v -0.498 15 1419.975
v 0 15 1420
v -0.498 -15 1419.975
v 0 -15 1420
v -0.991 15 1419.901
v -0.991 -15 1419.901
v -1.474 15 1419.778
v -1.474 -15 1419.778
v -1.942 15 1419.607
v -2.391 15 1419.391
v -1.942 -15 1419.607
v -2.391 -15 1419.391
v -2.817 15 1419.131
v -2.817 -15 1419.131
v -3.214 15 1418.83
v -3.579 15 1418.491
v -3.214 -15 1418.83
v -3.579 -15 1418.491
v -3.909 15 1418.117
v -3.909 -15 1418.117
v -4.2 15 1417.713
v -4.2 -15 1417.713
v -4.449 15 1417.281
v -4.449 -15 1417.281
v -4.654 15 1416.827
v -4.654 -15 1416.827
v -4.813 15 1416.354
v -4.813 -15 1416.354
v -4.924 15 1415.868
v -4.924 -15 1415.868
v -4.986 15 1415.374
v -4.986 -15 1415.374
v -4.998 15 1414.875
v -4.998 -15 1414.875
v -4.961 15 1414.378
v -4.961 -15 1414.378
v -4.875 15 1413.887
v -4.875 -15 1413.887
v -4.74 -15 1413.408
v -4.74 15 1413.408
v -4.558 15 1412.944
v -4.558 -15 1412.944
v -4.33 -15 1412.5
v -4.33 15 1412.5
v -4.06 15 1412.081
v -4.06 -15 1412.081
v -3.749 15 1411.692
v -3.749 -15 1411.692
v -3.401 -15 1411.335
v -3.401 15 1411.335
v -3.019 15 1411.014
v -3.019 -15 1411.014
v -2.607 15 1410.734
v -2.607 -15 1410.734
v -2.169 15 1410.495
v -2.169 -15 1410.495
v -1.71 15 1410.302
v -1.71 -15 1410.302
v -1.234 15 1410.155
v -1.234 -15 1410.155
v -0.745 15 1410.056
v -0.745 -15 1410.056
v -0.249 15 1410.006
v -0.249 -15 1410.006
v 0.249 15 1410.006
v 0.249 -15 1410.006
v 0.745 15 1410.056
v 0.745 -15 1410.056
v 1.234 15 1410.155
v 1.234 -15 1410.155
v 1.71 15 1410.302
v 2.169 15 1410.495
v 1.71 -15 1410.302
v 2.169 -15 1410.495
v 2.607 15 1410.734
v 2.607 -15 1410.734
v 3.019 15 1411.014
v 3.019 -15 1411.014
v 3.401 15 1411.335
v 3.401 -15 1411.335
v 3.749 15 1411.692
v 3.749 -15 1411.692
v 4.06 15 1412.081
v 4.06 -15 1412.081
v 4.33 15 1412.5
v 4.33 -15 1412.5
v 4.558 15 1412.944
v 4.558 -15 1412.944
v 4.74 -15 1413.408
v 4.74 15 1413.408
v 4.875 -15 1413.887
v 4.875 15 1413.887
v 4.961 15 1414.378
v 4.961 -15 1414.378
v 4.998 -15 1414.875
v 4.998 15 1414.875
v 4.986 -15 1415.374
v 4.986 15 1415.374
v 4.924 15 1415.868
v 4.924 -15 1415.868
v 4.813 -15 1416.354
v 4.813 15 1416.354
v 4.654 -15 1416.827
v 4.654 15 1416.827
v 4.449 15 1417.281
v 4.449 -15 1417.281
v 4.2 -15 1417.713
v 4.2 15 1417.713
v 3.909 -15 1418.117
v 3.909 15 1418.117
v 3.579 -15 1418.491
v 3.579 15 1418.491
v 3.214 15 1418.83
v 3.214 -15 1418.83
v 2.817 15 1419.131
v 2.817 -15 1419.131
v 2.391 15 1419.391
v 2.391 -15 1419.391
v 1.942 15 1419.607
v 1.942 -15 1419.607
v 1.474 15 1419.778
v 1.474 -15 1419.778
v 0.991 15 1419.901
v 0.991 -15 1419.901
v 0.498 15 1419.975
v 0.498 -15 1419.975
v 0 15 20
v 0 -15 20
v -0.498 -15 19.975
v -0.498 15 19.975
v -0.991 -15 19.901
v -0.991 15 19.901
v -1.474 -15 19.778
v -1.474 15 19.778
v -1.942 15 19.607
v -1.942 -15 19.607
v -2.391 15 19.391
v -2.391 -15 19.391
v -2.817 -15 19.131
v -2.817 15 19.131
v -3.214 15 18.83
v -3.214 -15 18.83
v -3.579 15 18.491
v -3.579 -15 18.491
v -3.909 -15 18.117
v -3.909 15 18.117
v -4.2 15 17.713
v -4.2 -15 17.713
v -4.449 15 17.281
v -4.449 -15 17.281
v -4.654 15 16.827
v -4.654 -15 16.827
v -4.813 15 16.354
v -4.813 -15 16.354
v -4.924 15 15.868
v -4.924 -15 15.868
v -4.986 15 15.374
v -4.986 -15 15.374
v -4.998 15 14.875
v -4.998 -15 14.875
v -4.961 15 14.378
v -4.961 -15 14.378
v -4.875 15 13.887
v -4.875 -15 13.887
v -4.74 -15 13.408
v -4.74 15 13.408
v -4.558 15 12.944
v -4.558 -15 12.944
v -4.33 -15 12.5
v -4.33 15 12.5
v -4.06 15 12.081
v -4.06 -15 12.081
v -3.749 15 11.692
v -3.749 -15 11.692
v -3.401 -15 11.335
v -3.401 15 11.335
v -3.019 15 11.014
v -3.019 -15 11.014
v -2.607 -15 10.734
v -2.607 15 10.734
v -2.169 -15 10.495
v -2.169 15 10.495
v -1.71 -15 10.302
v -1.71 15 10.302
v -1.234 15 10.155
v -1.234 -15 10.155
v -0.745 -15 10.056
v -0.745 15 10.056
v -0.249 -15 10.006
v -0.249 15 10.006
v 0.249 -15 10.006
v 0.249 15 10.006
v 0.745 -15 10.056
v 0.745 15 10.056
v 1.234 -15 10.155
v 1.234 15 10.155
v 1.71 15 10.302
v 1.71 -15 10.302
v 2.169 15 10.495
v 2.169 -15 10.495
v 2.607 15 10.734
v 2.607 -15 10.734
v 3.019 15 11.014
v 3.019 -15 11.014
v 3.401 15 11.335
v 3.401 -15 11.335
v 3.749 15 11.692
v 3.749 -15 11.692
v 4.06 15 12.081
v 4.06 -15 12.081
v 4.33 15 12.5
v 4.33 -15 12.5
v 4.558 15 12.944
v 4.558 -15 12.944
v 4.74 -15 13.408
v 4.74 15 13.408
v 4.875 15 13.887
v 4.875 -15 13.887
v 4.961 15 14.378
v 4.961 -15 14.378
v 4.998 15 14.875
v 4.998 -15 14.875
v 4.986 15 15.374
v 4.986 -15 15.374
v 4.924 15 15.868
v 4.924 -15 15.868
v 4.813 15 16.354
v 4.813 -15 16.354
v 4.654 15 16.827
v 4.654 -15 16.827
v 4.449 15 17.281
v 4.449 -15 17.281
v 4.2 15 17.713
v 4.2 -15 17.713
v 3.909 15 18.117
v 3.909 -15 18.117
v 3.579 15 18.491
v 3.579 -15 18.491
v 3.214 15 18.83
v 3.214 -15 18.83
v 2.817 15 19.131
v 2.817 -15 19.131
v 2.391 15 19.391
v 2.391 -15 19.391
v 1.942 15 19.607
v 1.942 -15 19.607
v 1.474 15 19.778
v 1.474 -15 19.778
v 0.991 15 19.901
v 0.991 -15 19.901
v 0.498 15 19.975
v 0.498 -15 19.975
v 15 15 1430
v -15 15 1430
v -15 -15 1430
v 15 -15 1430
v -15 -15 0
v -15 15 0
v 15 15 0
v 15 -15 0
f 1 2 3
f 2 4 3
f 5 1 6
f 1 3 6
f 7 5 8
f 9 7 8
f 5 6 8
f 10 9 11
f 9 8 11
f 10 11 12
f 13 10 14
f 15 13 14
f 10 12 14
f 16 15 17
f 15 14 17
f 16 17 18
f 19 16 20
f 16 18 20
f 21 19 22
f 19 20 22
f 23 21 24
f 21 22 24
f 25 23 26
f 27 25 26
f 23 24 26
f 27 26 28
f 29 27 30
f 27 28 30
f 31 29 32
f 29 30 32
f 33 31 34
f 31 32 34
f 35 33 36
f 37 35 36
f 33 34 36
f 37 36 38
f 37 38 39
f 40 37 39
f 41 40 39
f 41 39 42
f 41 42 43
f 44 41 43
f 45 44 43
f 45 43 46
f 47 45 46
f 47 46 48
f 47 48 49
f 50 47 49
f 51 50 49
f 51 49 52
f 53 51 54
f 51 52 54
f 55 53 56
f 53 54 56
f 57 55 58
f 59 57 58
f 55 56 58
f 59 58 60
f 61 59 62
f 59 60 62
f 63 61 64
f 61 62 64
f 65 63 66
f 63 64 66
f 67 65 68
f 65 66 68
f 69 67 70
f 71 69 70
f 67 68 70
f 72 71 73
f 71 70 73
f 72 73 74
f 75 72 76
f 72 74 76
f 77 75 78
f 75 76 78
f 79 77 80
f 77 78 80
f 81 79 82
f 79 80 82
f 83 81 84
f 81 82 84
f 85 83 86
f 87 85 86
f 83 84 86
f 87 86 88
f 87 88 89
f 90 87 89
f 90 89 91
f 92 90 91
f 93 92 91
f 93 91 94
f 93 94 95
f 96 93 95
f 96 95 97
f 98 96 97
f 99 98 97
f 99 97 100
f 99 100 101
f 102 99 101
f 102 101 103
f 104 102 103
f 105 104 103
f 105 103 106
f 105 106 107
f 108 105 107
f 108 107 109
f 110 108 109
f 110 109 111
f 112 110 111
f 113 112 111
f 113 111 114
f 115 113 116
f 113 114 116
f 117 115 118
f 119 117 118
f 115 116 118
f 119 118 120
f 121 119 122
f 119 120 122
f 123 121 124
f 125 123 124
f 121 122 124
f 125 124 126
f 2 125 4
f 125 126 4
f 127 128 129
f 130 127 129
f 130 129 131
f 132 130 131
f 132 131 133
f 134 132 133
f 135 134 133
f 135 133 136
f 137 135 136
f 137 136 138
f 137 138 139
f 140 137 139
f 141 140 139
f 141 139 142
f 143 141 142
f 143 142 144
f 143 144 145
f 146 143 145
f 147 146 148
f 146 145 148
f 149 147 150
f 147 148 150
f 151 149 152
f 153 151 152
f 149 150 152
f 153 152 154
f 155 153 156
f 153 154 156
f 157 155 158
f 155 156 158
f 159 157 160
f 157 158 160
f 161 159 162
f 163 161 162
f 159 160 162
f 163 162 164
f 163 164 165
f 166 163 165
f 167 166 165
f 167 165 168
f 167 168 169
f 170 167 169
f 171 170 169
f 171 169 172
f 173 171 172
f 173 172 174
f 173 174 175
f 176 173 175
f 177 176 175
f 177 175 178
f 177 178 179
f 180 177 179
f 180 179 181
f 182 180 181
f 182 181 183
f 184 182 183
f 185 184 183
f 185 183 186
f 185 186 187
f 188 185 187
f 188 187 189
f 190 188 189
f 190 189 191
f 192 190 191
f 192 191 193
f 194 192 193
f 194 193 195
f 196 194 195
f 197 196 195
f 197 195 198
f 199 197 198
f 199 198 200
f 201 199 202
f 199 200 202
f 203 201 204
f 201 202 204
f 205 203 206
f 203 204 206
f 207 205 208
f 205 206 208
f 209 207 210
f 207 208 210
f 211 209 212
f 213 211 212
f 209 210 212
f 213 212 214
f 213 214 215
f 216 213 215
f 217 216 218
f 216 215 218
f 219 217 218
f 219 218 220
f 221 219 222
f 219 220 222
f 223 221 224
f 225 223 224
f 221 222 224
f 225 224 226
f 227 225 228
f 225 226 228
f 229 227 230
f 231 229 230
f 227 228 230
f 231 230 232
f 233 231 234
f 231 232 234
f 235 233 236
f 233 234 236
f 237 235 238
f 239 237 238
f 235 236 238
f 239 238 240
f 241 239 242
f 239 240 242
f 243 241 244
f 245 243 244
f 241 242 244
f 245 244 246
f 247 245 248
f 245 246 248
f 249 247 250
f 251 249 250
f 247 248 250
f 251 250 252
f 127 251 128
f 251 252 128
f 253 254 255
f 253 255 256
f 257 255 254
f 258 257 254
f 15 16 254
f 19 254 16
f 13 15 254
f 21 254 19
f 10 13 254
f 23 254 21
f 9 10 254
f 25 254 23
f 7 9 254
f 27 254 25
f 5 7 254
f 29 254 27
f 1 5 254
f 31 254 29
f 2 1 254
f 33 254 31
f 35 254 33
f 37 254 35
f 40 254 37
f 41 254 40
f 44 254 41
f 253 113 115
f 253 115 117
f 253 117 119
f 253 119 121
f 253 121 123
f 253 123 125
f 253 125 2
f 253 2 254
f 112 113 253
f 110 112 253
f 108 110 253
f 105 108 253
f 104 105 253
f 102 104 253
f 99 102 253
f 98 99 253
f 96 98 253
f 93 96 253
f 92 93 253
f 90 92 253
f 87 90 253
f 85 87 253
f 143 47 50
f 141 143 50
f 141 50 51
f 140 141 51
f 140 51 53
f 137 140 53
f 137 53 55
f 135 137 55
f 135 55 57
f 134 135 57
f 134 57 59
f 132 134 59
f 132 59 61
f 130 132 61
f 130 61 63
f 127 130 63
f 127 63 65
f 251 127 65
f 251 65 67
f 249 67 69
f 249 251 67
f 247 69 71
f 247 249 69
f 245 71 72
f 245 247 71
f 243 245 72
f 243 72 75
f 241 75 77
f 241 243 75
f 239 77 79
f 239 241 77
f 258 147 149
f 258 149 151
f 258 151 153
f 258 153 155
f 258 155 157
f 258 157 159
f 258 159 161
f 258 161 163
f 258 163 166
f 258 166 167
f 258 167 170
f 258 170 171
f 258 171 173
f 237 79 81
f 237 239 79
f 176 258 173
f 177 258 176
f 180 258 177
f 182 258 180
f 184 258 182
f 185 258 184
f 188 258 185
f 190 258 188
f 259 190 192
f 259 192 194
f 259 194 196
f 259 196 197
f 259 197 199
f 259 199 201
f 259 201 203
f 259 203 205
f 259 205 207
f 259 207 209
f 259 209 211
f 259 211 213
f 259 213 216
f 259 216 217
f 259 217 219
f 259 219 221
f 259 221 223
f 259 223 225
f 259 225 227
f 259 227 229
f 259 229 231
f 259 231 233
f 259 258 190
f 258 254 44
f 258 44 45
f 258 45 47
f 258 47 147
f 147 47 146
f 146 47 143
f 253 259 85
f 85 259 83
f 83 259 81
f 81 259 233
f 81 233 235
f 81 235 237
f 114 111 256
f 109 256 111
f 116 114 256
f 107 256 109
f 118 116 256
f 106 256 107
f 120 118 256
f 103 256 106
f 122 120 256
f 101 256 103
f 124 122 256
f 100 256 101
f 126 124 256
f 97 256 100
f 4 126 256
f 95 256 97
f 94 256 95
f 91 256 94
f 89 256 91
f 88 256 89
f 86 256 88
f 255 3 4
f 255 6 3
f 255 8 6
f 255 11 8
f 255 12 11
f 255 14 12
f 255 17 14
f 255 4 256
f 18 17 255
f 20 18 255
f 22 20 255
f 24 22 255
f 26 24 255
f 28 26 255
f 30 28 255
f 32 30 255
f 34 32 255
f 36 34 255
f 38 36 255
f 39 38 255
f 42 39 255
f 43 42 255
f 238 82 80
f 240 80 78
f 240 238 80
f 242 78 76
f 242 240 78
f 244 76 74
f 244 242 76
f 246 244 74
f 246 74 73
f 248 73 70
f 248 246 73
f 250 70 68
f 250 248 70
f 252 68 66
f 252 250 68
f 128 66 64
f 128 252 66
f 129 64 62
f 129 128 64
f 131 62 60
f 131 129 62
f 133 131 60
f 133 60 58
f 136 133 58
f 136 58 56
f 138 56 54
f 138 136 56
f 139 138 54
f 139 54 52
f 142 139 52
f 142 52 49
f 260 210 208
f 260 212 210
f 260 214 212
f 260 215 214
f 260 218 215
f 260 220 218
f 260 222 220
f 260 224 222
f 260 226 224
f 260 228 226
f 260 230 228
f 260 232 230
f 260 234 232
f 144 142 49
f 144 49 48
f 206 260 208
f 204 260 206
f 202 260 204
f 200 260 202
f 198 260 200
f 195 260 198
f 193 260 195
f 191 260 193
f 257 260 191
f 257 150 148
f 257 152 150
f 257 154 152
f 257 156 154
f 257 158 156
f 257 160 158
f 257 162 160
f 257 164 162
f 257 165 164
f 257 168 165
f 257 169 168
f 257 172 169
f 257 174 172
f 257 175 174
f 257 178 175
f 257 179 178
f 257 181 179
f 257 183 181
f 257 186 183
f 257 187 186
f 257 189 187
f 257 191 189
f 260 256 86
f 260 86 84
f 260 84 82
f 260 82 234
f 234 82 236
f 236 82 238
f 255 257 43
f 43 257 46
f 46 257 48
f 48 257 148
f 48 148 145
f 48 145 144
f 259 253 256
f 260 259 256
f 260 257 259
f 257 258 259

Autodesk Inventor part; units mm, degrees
ref_plane "YZ Plane" through (0, 0, 0) normal (1, 0, 0) x (0, 1, 0)
ref_plane "XZ Plane" through (0, 0, 0) normal (0, 1, 0) x (-1, 0, 0)
ref_plane "XY Plane" through (0, 0, 0) normal (0, 0, 1) x (1, 0, 0)
sketch "スケッチ4" plane through (0, 0, 0) normal (0, 0, 1) x (1, 0, 0)
  line L0 (-15, 15) -> (15, 15)
  line L1 (15, 15) -> (15, -15)
  line L2 (15, -15) -> (-15, -15)
  line L3 (-15, -15) -> (-15, 15)
  line L4 (-15, 15) -> (15, -15) construction
  line L5 (15, 15) -> (-15, -15) construction
  point P0 (0, 0)
  dimension "d14" = 30
  dimension "d15" = 30
extrude "押し出し2" add sketch "スケッチ4" along normal blind 1430
sketch "スケッチ5" plane through (-15, 15, 0) normal (0, 1, 0) x (1, 0, 0)
  line L0 (30, -1430) -> (0, -1430) projected
  line L1 (0, 0) -> (30, 0) projected
  point P0 (15, 0)
  point P1 (15, -1415)
  point P2 (15, -15)
  dimension "d18" = 15
  dimension "d19" = 15
hole "穴2" at (0, 15, 1415) at (0, 15, 15) direction (0, -1, 0) diameter 10 end through all
